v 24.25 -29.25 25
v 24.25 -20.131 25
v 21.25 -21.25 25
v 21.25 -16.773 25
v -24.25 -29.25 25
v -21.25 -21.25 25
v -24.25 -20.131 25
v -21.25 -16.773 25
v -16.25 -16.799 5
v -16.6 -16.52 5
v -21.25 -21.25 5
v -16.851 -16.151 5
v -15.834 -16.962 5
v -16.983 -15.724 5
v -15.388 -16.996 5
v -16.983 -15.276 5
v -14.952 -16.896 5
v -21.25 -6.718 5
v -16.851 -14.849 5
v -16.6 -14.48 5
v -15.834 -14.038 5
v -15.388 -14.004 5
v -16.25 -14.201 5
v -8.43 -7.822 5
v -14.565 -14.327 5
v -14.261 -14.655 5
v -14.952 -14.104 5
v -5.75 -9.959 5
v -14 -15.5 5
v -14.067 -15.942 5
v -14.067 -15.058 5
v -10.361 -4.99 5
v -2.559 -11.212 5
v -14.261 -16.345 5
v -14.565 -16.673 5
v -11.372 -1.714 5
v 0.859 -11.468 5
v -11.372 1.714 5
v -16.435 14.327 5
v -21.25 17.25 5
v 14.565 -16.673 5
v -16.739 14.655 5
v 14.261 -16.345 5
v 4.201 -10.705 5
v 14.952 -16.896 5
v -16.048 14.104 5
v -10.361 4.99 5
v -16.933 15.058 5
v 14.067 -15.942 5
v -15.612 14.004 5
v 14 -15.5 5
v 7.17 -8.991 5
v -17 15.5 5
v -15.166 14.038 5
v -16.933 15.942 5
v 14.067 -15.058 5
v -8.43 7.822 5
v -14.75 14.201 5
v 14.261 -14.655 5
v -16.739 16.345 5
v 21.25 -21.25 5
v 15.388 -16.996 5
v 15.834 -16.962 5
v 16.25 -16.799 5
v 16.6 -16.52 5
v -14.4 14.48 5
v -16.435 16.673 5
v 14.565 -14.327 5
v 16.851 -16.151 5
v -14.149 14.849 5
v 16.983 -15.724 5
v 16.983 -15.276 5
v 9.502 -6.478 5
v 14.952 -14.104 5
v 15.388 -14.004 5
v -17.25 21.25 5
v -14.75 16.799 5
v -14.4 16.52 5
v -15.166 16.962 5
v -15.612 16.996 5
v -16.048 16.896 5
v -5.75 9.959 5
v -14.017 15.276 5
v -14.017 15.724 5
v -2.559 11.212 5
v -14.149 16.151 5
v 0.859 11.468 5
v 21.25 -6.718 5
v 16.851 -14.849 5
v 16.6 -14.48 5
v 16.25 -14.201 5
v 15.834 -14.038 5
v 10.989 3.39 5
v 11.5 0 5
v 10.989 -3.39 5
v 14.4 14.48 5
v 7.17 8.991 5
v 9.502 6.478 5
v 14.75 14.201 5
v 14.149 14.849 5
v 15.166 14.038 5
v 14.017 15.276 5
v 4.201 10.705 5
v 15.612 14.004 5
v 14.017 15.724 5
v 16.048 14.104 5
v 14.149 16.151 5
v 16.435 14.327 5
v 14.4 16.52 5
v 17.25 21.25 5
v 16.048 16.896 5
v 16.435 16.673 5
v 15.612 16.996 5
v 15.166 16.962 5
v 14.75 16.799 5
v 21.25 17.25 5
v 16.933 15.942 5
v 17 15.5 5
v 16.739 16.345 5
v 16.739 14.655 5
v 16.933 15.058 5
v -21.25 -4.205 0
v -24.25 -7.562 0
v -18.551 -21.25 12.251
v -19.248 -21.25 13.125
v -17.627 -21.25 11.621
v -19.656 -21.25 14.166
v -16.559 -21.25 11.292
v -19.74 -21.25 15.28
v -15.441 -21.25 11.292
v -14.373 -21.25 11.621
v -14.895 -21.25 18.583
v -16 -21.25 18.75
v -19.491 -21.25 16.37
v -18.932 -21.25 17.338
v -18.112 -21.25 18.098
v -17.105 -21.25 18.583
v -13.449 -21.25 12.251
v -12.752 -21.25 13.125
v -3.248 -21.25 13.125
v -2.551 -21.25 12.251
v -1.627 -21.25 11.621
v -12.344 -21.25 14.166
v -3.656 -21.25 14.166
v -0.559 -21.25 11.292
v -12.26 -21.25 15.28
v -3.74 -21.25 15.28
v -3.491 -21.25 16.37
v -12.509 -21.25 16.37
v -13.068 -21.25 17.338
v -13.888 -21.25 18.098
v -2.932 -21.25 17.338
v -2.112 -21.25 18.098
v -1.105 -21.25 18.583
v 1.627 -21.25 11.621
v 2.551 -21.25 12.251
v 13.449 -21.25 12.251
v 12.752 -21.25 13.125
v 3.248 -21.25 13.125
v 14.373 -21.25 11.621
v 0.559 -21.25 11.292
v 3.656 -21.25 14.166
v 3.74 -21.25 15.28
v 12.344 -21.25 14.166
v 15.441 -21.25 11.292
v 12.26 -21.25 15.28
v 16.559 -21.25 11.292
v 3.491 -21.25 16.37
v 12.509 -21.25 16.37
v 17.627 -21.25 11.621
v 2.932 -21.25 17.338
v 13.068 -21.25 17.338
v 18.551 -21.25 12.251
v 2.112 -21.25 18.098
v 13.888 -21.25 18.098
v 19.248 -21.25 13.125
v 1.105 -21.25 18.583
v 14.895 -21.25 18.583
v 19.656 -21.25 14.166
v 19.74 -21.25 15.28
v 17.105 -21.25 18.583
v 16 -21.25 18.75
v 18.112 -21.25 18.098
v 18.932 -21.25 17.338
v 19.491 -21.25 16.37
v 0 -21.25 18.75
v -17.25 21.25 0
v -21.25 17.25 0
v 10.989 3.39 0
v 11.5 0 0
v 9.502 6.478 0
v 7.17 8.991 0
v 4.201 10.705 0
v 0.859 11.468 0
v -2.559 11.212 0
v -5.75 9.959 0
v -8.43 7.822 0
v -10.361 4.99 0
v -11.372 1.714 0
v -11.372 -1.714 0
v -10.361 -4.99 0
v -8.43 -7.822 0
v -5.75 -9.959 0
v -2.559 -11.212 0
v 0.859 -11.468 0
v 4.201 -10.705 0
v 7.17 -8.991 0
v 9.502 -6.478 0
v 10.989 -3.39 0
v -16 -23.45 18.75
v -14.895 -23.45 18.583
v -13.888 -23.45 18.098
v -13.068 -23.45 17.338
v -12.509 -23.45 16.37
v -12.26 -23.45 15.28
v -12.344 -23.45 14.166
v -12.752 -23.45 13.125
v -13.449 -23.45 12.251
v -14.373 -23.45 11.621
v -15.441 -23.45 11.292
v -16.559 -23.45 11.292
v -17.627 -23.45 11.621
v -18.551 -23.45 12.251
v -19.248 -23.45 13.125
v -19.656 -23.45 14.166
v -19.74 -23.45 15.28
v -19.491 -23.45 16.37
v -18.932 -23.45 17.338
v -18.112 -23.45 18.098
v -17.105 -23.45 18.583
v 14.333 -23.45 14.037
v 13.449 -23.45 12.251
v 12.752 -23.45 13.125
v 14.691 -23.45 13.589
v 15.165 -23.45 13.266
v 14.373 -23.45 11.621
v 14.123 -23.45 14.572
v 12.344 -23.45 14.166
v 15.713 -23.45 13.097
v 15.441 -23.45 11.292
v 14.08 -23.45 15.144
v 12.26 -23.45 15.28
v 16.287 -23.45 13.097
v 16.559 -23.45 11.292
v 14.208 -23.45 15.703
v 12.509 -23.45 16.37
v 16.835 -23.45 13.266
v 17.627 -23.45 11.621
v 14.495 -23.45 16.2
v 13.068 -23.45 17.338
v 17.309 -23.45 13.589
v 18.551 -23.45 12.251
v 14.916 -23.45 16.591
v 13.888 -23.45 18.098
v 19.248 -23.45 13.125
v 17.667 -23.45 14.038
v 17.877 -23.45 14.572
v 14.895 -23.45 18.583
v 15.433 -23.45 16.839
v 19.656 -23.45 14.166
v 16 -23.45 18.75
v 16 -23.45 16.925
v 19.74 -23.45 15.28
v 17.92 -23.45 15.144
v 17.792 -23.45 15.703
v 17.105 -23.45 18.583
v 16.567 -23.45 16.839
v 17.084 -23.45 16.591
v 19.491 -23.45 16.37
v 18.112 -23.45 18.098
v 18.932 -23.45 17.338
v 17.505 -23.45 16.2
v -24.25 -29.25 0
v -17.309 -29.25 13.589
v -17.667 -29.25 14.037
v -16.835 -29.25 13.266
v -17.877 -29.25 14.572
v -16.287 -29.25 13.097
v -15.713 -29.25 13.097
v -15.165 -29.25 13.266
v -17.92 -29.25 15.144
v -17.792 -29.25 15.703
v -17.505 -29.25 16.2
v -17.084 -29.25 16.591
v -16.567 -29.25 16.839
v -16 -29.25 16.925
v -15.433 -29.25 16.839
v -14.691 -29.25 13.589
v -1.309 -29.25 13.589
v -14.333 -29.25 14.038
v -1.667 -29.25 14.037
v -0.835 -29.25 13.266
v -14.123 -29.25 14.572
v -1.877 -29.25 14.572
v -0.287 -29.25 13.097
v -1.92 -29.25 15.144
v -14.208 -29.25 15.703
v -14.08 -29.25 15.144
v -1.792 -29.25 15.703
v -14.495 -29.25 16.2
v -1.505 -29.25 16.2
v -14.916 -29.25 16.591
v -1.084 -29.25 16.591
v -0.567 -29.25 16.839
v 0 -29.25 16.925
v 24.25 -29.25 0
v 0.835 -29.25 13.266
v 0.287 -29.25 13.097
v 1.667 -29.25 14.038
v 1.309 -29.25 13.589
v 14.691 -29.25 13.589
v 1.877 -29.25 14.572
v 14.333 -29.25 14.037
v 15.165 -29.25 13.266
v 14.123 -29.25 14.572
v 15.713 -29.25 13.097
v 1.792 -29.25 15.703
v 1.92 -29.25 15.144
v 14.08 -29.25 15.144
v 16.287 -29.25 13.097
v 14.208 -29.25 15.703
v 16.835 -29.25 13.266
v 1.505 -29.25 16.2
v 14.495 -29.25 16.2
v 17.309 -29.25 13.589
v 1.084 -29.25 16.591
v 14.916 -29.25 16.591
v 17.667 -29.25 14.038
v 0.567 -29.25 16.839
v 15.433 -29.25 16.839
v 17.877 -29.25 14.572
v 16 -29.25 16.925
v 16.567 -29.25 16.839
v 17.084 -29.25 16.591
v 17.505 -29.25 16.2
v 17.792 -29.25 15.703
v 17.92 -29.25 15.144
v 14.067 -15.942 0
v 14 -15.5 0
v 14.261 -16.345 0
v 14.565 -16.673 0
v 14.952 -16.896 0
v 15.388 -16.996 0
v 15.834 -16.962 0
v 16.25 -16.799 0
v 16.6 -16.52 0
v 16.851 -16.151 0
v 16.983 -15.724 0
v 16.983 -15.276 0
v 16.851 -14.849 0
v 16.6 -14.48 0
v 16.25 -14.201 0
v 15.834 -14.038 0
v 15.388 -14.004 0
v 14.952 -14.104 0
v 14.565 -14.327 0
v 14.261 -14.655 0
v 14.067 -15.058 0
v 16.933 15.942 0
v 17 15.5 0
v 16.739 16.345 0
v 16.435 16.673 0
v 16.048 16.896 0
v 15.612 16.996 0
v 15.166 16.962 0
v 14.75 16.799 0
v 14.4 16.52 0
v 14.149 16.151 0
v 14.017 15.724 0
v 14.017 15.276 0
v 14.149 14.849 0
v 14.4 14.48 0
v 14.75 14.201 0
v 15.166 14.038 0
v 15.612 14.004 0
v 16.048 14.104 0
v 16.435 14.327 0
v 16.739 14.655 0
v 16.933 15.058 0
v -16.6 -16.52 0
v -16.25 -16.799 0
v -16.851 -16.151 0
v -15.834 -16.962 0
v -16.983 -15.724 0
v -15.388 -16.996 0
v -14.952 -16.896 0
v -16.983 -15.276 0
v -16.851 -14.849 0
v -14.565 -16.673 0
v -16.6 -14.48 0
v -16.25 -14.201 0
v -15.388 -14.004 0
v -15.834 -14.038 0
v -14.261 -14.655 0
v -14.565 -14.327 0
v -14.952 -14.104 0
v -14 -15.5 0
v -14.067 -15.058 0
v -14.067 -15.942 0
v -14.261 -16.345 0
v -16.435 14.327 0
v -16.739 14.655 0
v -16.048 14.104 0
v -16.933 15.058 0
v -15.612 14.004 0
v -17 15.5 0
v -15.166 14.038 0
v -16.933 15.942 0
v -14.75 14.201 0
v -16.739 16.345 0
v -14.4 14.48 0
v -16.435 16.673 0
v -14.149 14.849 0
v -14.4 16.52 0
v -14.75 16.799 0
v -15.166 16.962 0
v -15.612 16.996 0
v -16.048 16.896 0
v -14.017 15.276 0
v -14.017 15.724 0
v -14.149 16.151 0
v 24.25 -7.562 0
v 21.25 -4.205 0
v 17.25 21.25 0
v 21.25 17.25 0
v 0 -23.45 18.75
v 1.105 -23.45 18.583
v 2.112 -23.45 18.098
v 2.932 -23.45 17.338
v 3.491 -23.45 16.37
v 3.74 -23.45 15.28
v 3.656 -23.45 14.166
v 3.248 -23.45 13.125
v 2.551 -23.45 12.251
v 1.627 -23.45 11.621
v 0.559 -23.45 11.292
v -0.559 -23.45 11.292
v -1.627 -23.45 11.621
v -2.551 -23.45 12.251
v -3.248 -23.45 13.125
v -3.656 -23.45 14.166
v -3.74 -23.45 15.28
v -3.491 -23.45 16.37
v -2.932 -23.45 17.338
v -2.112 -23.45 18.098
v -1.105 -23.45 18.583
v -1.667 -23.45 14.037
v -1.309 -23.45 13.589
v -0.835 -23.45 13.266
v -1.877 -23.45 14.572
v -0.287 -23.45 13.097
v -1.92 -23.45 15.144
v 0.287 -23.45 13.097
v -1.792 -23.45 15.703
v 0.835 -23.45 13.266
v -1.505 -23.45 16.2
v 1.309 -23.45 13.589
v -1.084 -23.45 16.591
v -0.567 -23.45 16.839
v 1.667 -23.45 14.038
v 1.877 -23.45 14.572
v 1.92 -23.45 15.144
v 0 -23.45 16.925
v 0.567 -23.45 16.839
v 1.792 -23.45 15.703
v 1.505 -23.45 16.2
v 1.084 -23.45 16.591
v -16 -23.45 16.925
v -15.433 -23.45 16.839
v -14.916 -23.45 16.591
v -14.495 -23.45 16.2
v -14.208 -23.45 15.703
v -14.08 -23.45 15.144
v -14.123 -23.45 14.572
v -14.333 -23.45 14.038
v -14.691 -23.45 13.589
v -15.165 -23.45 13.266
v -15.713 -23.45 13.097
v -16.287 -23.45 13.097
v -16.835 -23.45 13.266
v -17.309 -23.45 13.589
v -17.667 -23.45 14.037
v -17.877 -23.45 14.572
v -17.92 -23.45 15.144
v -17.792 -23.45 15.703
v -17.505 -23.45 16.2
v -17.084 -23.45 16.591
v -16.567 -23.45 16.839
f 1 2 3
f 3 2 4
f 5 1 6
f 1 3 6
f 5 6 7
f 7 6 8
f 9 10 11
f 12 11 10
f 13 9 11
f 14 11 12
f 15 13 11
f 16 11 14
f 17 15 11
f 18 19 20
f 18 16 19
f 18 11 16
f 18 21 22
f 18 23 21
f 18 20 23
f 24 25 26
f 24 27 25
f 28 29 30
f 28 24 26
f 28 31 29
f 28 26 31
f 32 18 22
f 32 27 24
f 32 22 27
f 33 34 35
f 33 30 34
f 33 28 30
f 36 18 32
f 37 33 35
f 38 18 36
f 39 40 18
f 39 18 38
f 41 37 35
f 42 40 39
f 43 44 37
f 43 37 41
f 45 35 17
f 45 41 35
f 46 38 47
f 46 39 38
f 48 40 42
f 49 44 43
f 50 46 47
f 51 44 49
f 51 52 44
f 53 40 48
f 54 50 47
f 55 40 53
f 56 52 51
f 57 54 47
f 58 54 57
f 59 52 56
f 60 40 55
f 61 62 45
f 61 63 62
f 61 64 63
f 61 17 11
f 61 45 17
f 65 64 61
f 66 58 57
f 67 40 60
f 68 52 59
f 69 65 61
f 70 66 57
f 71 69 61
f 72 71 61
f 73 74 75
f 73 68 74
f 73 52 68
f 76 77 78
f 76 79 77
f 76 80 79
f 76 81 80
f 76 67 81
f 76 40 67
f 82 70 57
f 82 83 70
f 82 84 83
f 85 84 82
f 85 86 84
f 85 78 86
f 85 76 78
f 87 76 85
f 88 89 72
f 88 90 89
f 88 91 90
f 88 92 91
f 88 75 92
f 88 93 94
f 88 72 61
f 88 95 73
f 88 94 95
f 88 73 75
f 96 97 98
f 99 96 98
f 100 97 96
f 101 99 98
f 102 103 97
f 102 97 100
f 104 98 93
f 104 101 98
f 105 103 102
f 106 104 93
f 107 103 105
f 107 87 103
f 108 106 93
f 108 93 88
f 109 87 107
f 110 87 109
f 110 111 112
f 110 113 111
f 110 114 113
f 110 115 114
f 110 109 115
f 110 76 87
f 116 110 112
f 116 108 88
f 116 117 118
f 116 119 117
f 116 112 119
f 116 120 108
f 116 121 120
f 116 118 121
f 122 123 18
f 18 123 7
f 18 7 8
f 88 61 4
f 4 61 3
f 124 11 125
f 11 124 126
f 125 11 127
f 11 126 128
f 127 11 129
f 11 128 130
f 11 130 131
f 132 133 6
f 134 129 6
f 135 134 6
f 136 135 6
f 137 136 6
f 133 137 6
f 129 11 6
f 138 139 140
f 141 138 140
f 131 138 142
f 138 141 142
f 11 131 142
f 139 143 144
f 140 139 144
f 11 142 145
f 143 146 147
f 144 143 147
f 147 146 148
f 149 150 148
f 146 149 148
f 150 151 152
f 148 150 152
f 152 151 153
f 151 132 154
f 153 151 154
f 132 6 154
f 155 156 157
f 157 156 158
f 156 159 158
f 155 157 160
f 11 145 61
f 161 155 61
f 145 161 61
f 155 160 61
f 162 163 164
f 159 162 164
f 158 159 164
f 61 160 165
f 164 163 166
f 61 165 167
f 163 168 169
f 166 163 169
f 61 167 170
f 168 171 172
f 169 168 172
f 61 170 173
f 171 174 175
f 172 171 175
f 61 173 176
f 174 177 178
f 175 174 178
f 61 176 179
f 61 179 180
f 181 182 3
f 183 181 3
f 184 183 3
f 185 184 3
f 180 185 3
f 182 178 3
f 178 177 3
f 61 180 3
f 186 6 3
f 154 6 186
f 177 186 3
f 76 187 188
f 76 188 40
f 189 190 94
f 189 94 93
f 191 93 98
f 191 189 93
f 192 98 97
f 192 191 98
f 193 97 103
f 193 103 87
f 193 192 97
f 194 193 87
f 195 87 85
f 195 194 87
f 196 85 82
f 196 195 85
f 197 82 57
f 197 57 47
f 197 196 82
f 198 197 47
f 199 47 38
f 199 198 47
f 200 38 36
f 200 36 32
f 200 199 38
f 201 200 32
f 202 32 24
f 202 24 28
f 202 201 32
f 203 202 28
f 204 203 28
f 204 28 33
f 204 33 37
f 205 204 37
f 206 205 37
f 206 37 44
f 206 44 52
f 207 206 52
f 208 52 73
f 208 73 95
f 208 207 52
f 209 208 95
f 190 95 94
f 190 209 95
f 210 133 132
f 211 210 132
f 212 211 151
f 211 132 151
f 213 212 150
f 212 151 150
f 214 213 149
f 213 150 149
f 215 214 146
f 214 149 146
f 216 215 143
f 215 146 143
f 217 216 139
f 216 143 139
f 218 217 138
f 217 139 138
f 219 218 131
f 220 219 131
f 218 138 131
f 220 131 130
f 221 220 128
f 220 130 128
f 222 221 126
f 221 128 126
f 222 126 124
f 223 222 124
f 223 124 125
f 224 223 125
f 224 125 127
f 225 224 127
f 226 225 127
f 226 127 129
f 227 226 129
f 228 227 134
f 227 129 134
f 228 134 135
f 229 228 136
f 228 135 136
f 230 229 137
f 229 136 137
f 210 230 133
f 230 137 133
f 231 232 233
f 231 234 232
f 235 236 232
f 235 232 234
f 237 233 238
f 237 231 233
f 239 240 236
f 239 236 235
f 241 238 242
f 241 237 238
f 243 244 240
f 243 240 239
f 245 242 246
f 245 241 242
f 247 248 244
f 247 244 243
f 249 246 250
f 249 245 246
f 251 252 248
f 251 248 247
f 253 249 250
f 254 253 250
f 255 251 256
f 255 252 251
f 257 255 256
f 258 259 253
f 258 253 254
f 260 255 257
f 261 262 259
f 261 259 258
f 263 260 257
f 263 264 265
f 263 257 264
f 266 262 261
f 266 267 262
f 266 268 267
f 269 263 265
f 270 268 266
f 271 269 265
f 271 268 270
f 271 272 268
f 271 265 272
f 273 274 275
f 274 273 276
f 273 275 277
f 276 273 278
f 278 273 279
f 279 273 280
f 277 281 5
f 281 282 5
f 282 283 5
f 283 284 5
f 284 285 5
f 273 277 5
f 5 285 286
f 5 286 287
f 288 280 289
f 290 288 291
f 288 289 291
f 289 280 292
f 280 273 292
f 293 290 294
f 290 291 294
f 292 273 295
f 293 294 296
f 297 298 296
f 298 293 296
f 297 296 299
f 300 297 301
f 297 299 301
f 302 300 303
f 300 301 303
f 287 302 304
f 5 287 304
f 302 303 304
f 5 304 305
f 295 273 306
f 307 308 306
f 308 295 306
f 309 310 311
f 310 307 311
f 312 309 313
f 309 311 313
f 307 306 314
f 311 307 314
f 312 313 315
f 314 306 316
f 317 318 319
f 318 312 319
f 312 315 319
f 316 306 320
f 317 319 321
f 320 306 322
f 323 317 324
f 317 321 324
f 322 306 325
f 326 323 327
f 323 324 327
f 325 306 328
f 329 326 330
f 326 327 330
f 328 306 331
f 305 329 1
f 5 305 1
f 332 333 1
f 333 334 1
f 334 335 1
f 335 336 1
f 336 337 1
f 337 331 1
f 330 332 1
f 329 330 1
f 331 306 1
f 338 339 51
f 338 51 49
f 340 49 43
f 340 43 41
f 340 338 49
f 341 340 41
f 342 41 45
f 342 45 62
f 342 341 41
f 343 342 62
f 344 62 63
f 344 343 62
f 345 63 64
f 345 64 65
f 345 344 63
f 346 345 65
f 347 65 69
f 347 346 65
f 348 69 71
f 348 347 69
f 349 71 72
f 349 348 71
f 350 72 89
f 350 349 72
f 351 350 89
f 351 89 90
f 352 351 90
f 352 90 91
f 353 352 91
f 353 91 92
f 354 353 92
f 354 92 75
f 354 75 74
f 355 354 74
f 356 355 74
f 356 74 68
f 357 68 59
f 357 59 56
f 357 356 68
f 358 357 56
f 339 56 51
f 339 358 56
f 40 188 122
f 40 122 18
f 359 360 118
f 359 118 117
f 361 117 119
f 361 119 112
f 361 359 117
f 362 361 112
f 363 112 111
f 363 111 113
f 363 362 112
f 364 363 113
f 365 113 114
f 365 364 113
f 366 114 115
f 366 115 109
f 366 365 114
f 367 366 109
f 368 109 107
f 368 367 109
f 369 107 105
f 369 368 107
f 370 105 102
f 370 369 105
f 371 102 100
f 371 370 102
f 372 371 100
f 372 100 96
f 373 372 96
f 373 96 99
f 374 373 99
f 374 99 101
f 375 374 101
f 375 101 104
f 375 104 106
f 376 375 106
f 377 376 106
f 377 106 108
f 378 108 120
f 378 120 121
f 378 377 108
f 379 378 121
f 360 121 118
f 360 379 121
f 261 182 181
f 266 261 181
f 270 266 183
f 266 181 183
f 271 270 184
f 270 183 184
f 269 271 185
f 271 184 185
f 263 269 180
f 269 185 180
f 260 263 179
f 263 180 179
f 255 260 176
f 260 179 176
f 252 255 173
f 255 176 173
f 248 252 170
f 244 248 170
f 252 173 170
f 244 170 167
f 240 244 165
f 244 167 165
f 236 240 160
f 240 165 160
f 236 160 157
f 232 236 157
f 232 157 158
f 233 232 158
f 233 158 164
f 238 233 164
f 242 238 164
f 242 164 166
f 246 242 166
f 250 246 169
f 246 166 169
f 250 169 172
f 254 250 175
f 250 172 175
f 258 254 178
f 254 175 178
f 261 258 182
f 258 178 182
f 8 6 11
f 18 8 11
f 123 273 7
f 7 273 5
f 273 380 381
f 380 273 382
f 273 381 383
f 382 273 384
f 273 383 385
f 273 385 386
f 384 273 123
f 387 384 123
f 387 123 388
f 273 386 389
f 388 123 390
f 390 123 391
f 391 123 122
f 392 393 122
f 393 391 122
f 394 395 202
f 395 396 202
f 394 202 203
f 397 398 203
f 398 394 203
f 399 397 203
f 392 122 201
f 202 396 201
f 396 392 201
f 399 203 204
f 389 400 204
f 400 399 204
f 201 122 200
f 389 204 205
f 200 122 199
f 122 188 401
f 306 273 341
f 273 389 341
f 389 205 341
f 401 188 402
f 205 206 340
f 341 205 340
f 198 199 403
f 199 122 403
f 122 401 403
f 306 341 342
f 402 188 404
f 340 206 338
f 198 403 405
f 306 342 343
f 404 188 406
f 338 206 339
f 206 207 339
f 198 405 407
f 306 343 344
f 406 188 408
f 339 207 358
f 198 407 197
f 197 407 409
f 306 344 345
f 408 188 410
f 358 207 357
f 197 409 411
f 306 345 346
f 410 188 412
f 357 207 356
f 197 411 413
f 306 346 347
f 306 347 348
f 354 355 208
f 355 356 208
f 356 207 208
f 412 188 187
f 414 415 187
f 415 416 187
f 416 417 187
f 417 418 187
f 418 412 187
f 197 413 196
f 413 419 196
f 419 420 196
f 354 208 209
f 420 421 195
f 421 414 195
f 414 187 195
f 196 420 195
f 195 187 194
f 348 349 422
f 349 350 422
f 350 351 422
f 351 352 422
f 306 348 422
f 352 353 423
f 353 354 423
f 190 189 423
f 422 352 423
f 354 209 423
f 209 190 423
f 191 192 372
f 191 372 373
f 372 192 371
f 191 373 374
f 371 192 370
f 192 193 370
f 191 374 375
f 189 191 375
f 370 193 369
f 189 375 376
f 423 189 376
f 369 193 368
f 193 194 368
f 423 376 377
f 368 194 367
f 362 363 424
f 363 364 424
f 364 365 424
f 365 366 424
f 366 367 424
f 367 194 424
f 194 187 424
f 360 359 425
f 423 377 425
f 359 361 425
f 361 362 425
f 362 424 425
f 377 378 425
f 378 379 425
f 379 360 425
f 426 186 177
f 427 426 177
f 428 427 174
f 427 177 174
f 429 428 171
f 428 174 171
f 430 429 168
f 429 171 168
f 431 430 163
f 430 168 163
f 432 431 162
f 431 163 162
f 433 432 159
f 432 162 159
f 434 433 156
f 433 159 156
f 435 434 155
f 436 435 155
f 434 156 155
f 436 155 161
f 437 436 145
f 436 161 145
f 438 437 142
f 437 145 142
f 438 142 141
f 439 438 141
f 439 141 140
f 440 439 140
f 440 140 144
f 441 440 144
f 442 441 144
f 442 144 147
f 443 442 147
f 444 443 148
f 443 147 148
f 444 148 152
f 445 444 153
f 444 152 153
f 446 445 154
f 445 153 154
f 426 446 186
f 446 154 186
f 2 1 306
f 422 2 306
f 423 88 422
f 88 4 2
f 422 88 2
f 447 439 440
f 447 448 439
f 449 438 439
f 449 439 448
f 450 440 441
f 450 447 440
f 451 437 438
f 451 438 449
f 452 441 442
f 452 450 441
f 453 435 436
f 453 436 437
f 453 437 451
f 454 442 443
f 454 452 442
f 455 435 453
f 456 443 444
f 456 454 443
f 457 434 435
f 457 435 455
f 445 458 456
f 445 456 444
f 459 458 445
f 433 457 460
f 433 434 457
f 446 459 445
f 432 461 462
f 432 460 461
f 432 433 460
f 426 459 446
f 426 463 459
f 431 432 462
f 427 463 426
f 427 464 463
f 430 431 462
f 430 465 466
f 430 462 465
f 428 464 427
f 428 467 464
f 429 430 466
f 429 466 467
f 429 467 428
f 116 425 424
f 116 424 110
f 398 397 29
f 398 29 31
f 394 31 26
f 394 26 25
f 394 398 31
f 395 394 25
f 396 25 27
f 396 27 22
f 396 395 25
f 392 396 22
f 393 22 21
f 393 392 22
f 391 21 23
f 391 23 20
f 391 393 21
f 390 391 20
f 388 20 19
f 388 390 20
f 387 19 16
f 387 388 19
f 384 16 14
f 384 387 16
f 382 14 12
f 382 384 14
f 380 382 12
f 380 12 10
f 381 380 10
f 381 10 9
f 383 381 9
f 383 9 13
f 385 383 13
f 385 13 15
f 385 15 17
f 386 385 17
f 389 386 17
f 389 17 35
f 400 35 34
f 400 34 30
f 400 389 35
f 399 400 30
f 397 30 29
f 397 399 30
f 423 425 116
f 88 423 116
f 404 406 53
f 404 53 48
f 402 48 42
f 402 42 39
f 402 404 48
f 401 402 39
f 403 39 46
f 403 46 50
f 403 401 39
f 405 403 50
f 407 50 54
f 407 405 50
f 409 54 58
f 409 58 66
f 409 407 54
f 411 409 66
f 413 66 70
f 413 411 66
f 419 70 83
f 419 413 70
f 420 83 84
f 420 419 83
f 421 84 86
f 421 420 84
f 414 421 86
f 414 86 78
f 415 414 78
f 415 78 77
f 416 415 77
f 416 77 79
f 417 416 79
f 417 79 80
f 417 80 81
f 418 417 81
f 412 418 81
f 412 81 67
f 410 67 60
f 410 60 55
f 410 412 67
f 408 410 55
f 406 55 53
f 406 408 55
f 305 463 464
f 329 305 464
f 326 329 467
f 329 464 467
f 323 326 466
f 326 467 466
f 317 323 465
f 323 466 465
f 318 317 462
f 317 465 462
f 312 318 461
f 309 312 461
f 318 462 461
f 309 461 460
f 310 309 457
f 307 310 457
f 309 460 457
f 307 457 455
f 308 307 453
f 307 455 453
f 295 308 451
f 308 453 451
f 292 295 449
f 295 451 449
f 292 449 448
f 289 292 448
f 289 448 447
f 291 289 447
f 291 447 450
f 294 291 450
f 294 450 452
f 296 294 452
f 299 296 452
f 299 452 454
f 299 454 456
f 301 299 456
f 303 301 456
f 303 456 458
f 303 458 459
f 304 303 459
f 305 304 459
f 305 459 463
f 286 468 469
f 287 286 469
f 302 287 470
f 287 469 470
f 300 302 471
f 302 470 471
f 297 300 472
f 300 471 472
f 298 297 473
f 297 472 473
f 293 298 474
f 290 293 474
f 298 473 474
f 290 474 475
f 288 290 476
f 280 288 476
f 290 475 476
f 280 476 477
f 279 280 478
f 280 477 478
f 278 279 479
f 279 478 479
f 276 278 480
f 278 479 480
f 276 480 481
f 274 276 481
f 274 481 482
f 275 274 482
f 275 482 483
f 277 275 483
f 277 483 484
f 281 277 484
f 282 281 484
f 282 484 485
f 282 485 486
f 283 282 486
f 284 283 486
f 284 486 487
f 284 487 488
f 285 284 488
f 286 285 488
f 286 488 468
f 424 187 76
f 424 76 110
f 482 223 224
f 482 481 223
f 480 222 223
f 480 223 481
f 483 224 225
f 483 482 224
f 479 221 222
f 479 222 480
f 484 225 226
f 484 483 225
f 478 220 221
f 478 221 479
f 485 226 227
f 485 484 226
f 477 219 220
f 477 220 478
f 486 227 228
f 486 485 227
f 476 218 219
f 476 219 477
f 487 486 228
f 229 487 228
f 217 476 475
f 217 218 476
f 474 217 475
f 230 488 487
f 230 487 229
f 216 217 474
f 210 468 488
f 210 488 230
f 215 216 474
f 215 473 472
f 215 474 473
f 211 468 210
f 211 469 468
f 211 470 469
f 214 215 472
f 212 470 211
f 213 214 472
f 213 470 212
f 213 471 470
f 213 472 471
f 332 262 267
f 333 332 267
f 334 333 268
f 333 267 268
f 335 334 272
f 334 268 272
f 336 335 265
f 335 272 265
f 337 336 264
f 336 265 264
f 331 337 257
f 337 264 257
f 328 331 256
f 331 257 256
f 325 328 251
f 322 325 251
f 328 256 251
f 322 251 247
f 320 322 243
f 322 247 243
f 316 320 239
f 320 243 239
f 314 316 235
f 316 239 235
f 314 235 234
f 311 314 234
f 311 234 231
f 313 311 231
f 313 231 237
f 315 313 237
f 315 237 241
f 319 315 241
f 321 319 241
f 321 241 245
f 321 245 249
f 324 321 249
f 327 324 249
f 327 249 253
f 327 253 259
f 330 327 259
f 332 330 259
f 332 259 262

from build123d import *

# Parameters (mm, degrees)
SKETCH1_W           = 42.5
SKETCH1_H           = 42.5
SKETCH1_R           = 1.5
SKETCH1_R_2         = 11.5
BOSS_EXTRUDE1_DEPTH = 5
CHAMFER1_SIZE       = 4
SKETCH2_W           = 42.5
SKETCH2_H           = 25
BOSS_EXTRUDE2_DEPTH = 8
BOSS_EXTRUDE3_DEPTH = 3
SKETCH4_R           = 3.75
CUT_EXTRUDE1_DEPTH  = 2.2
SKETCH5_R           = 1.925
CUT_EXTRUDE2_DEPTH  = 57.667031862


with BuildPart() as part:
    # Sketch1 → Boss-Extrude1 (new body)
    with BuildSketch(Plane.XY):
        Rectangle(SKETCH1_W, SKETCH1_H)
        with Locations((15.5, 15.5)):
            Circle(SKETCH1_R, mode=Mode.SUBTRACT)
        with Locations(Location((-15.5, 15.5, 0), (0, 0, 180))):
            Circle(SKETCH1_R, mode=Mode.SUBTRACT)
        with Locations(Location((15.5, -15.5, 0), (0, 0, 180))):
            Circle(SKETCH1_R, mode=Mode.SUBTRACT)
        with Locations((-15.5, -15.5)):
            Circle(SKETCH1_R, mode=Mode.SUBTRACT)
        Circle(SKETCH1_R_2, mode=Mode.SUBTRACT)
    extrude(amount=BOSS_EXTRUDE1_DEPTH)

    # Chamfer1
    chamfer1_edges = [part.edges().sort_by_distance(p)[0] for p in [
        (-21.25, 21.25, 2.5),
        (21.25, 21.25, 2.5),
    ]]
    chamfer(chamfer1_edges, length=CHAMFER1_SIZE)

    # Sketch2 → Boss-Extrude2 (add)
    with BuildSketch(Plane.XZ.offset(21.25)):
        with Locations((0, 12.5)):
            Rectangle(SKETCH2_W, SKETCH2_H)
    extrude(amount=BOSS_EXTRUDE2_DEPTH)

    # Sketch3 → Boss-Extrude3 (add)
    with BuildSketch(Plane(origin=(21.25, 0, 0), x_dir=(0, 0, -1), z_dir=(1, 0, 0))):
        Polygon((-25, -21.25), (0, -8.681713823), (0, -29.25), (-25, -29.25), align=None)
    boss_extrude3 = extrude(amount=BOSS_EXTRUDE3_DEPTH)

    # Mirror3: Boss-Extrude3 across plane
    add(boss_extrude3.mirror(Plane(origin=(0, 0, 0), x_dir=(0, 0, 1), z_dir=(1, 0, 0))))

    # Chamfer2
    # the kernel refuses this chamfer: 4 mm, written as the material it adds along each edge
    with BuildSketch(Plane(origin=(-21.25, -22.284423421, 27.057606356), x_dir=(-0.9996219169112968, -0.02456616062709099, -0.012350181481602638), z_dir=(0, 0.44916485684431295, -0.8934488969023511))) as chamfer2_piece_1_section:
        with BuildLine():
            Line((4.114692781, 0), (-0.22618862, 4.108471174))
            Line((-0.22618862, 4.108471174), (-0.306158373, 4.106271504))
            ThreePointArc((-0.306158373, 4.106271504), (-0.136516908, 2.053591319), (-0.079969753, -0.00219967))
            Line((-0.079969753, -0.00219967), (0.00219967, -0.079969753))
            ThreePointArc((0.00219967, -0.079969753), (2.057990659, -0.023422598), (4.116892451, -0.079969753))
            Line((4.116892451, -0.079969753), (4.114692781, 0))
        make_face()
    chamfer2_piece_1 = extrude(amount=54.972604346, mode=Mode.PRIVATE)
    chamfer2_piece_1 = split(chamfer2_piece_1, bisect_by=Plane(origin=(-24.25, -14.705039529, 15), z_dir=(1, 0, 0)), keep=Keep.TOP, mode=Mode.PRIVATE)
    chamfer2_piece_1 = split(chamfer2_piece_1, bisect_by=Plane(origin=(-22.462839724, -14.705039529, 25), z_dir=(0, 0, -1)), keep=Keep.TOP, mode=Mode.PRIVATE)
    chamfer2_piece_1 = split(chamfer2_piece_1, bisect_by=Plane(origin=(-21.25, -14.705039529, 15), z_dir=(-1, 0, 0)), keep=Keep.TOP, mode=Mode.PRIVATE)
    chamfer2_piece_1 = split(chamfer2_piece_1, bisect_by=Plane(origin=(-22.462839724, -14.705039529, 5), z_dir=(0, 0, 1)), keep=Keep.TOP, mode=Mode.PRIVATE)
    add(chamfer2_piece_1)
    with BuildSketch(Plane(origin=(-21.25, -22.284423421, 27.057606356), x_dir=(-0.9996219169112968, -0.02456616062709099, -0.012350181481602638), z_dir=(0, 0.44916485684431295, -0.8934488969023511))) as chamfer2_piece_2_section:
        with BuildLine():
            Line((4.114692781, 0), (-0.22618862, 4.108471174))
            Line((-0.22618862, 4.108471174), (-0.306158373, 4.106271504))
            ThreePointArc((-0.306158373, 4.106271504), (-0.136516908, 2.053591319), (-0.079969753, -0.00219967))
            Line((-0.079969753, -0.00219967), (0.00219967, -0.079969753))
            ThreePointArc((0.00219967, -0.079969753), (2.057990659, -0.023422598), (4.116892451, -0.079969753))
            Line((4.116892451, -0.079969753), (4.114692781, 0))
        make_face()
    chamfer2_piece_2 = extrude(amount=54.972604346, mode=Mode.PRIVATE)
    chamfer2_piece_2 = split(chamfer2_piece_2, bisect_by=Plane(origin=(-24.25, -8.42089644, 2.5), z_dir=(1, 0, 0)), keep=Keep.TOP, mode=Mode.PRIVATE)
    chamfer2_piece_2 = split(chamfer2_piece_2, bisect_by=Plane(origin=(-22.462839724, -8.42089644, 0), z_dir=(0, 0, 1)), keep=Keep.TOP, mode=Mode.PRIVATE)
    chamfer2_piece_2 = split(chamfer2_piece_2, bisect_by=Plane(origin=(-21.25, -8.42089644, 2.5), z_dir=(-1, 0, 0)), keep=Keep.TOP, mode=Mode.PRIVATE)
    chamfer2_piece_2 = split(chamfer2_piece_2, bisect_by=Plane(origin=(-22.462839724, -8.42089644, 5), z_dir=(0, 0, -1)), keep=Keep.TOP, mode=Mode.PRIVATE)
    add(chamfer2_piece_2)
    with BuildSketch(Plane(origin=(-21.25, -22.284423421, 27.057606356), x_dir=(-0.9996219169112968, -0.02456616062709099, -0.012350181481602638), z_dir=(0, 0.44916485684431295, -0.8934488969023511))) as chamfer2_piece_3_section:
        with BuildLine():
            Line((4.114692781, 0), (-0.22618862, 4.108471174))
            Line((-0.22618862, 4.108471174), (-0.306158373, 4.106271504))
            ThreePointArc((-0.306158373, 4.106271504), (-0.136516908, 2.053591319), (-0.079969753, -0.00219967))
            Line((-0.079969753, -0.00219967), (0.00219967, -0.079969753))
            ThreePointArc((0.00219967, -0.079969753), (2.057990659, -0.023422598), (4.116892451, -0.079969753))
            Line((4.116892451, -0.079969753), (4.114692781, 0))
        make_face()
    chamfer2_piece_3 = extrude(amount=54.972604346, mode=Mode.PRIVATE)
    chamfer2_piece_3 = split(chamfer2_piece_3, bisect_by=Plane(origin=(-21.193688037, -7.24875826, 0), z_dir=(0, 0, 1)), keep=Keep.TOP, mode=Mode.PRIVATE)
    chamfer2_piece_3 = split(chamfer2_piece_3, bisect_by=Plane(origin=(-21.25, -7.24875826, 2.5), z_dir=(1, 0, 0)), keep=Keep.TOP, mode=Mode.PRIVATE)
    chamfer2_piece_3 = split(chamfer2_piece_3, bisect_by=Plane(origin=(-21.193688037, -7.24875826, 5), z_dir=(0, 0, -1)), keep=Keep.TOP, mode=Mode.PRIVATE)
    add(chamfer2_piece_3)
    with BuildSketch(Plane(origin=(21.25, -22.284423421, 27.057606356), x_dir=(-0.027495876610586504, 0.8931110989838116, 0.4489950352079003), z_dir=(0, 0.44916485684431295, -0.8934488969023511))) as chamfer2_piece_4_section:
        with BuildLine():
            Line((4.114692781, 0), (-0.22618862, 4.108471174))
            Line((-0.22618862, 4.108471174), (-0.306158373, 4.106271504))
            ThreePointArc((-0.306158373, 4.106271504), (-0.136516908, 2.053591319), (-0.079969753, -0.00219967))
            Line((-0.079969753, -0.00219967), (0.00219967, -0.079969753))
            ThreePointArc((0.00219967, -0.079969753), (2.057990659, -0.023422598), (4.116892451, -0.079969753))
            Line((4.116892451, -0.079969753), (4.114692781, 0))
        make_face()
    chamfer2_piece_4 = extrude(amount=54.972604346, mode=Mode.PRIVATE)
    chamfer2_piece_4 = split(chamfer2_piece_4, bisect_by=Plane(origin=(22.462839724, -14.705039529, 5), z_dir=(0, 0, 1)), keep=Keep.TOP, mode=Mode.PRIVATE)
    chamfer2_piece_4 = split(chamfer2_piece_4, bisect_by=Plane(origin=(22.462839724, -14.705039529, 25), z_dir=(0, 0, -1)), keep=Keep.TOP, mode=Mode.PRIVATE)
    chamfer2_piece_4 = split(chamfer2_piece_4, bisect_by=Plane(origin=(21.25, -14.705039529, 15), z_dir=(1, 0, 0)), keep=Keep.TOP, mode=Mode.PRIVATE)
    chamfer2_piece_4 = split(chamfer2_piece_4, bisect_by=Plane(origin=(24.25, -14.705039529, 15), z_dir=(-1, 0, 0)), keep=Keep.TOP, mode=Mode.PRIVATE)
    add(chamfer2_piece_4)
    with BuildSketch(Plane(origin=(21.25, -22.284423421, 27.057606356), x_dir=(-0.027495876610586504, 0.8931110989838116, 0.4489950352079003), z_dir=(0, 0.44916485684431295, -0.8934488969023511))) as chamfer2_piece_5_section:
        with BuildLine():
            Line((4.114692781, 0), (-0.22618862, 4.108471174))
            Line((-0.22618862, 4.108471174), (-0.306158373, 4.106271504))
            ThreePointArc((-0.306158373, 4.106271504), (-0.136516908, 2.053591319), (-0.079969753, -0.00219967))
            Line((-0.079969753, -0.00219967), (0.00219967, -0.079969753))
            ThreePointArc((0.00219967, -0.079969753), (2.057990659, -0.023422598), (4.116892451, -0.079969753))
            Line((4.116892451, -0.079969753), (4.114692781, 0))
        make_face()
    chamfer2_piece_5 = extrude(amount=54.972604346, mode=Mode.PRIVATE)
    chamfer2_piece_5 = split(chamfer2_piece_5, bisect_by=Plane(origin=(21.193688037, -7.24875826, 0), z_dir=(0, 0, 1)), keep=Keep.TOP, mode=Mode.PRIVATE)
    chamfer2_piece_5 = split(chamfer2_piece_5, bisect_by=Plane(origin=(21.193688037, -7.24875826, 5), z_dir=(0, 0, -1)), keep=Keep.TOP, mode=Mode.PRIVATE)
    chamfer2_piece_5 = split(chamfer2_piece_5, bisect_by=Plane(origin=(21.25, -7.24875826, 2.5), z_dir=(-1, 0, 0)), keep=Keep.TOP, mode=Mode.PRIVATE)
    add(chamfer2_piece_5)
    with BuildSketch(Plane(origin=(21.25, -22.284423421, 27.057606356), x_dir=(-0.027495876610586504, 0.8931110989838116, 0.4489950352079003), z_dir=(0, 0.44916485684431295, -0.8934488969023511))) as chamfer2_piece_6_section:
        with BuildLine():
            Line((4.114692781, 0), (-0.22618862, 4.108471174))
            Line((-0.22618862, 4.108471174), (-0.306158373, 4.106271504))
            ThreePointArc((-0.306158373, 4.106271504), (-0.136516908, 2.053591319), (-0.079969753, -0.00219967))
            Line((-0.079969753, -0.00219967), (0.00219967, -0.079969753))
            ThreePointArc((0.00219967, -0.079969753), (2.057990659, -0.023422598), (4.116892451, -0.079969753))
            Line((4.116892451, -0.079969753), (4.114692781, 0))
        make_face()
    chamfer2_piece_6 = extrude(amount=54.972604346, mode=Mode.PRIVATE)
    chamfer2_piece_6 = split(chamfer2_piece_6, bisect_by=Plane(origin=(22.462839724, -8.42089644, 0), z_dir=(0, 0, 1)), keep=Keep.TOP, mode=Mode.PRIVATE)
    chamfer2_piece_6 = split(chamfer2_piece_6, bisect_by=Plane(origin=(22.462839724, -8.42089644, 5), z_dir=(0, 0, -1)), keep=Keep.TOP, mode=Mode.PRIVATE)
    chamfer2_piece_6 = split(chamfer2_piece_6, bisect_by=Plane(origin=(21.25, -8.42089644, 2.5), z_dir=(1, 0, 0)), keep=Keep.TOP, mode=Mode.PRIVATE)
    chamfer2_piece_6 = split(chamfer2_piece_6, bisect_by=Plane(origin=(24.25, -8.42089644, 2.5), z_dir=(-1, 0, 0)), keep=Keep.TOP, mode=Mode.PRIVATE)
    add(chamfer2_piece_6)

    # Sketch4 → Cut-Extrude1 (cut)
    with BuildSketch(Plane(origin=(0, -21.25, 0), x_dir=(1, 0, 0), z_dir=(0, 1, 0))):
        with Locations(Location((0, -15, 0), (0, 0, 270))):
            Circle(SKETCH4_R)
        with Locations(Location((16, -15, 0), (0, 0, 270))):
            Circle(SKETCH4_R)
        with Locations(Location((-16, -15, 0), (0, 0, 270))):
            Circle(SKETCH4_R)
    extrude(amount=-CUT_EXTRUDE1_DEPTH, mode=Mode.SUBTRACT)

    # Sketch5 → Cut-Extrude2 (cut, through all)
    with BuildSketch(Plane(origin=(0, -23.45, 0), x_dir=(1, 0, 0), z_dir=(0, 1, 0))):
        with Locations(Location((0, -15, 0), (0, 0, 270))):
            Circle(SKETCH5_R)
        with Locations(Location((16, -15, 0), (0, 0, 270))):
            Circle(SKETCH5_R)
        with Locations(Location((-16, -15, 0), (0, 0, 270))):
            Circle(SKETCH5_R)
    extrude(amount=-CUT_EXTRUDE2_DEPTH, mode=Mode.SUBTRACT)


solid = part.part
